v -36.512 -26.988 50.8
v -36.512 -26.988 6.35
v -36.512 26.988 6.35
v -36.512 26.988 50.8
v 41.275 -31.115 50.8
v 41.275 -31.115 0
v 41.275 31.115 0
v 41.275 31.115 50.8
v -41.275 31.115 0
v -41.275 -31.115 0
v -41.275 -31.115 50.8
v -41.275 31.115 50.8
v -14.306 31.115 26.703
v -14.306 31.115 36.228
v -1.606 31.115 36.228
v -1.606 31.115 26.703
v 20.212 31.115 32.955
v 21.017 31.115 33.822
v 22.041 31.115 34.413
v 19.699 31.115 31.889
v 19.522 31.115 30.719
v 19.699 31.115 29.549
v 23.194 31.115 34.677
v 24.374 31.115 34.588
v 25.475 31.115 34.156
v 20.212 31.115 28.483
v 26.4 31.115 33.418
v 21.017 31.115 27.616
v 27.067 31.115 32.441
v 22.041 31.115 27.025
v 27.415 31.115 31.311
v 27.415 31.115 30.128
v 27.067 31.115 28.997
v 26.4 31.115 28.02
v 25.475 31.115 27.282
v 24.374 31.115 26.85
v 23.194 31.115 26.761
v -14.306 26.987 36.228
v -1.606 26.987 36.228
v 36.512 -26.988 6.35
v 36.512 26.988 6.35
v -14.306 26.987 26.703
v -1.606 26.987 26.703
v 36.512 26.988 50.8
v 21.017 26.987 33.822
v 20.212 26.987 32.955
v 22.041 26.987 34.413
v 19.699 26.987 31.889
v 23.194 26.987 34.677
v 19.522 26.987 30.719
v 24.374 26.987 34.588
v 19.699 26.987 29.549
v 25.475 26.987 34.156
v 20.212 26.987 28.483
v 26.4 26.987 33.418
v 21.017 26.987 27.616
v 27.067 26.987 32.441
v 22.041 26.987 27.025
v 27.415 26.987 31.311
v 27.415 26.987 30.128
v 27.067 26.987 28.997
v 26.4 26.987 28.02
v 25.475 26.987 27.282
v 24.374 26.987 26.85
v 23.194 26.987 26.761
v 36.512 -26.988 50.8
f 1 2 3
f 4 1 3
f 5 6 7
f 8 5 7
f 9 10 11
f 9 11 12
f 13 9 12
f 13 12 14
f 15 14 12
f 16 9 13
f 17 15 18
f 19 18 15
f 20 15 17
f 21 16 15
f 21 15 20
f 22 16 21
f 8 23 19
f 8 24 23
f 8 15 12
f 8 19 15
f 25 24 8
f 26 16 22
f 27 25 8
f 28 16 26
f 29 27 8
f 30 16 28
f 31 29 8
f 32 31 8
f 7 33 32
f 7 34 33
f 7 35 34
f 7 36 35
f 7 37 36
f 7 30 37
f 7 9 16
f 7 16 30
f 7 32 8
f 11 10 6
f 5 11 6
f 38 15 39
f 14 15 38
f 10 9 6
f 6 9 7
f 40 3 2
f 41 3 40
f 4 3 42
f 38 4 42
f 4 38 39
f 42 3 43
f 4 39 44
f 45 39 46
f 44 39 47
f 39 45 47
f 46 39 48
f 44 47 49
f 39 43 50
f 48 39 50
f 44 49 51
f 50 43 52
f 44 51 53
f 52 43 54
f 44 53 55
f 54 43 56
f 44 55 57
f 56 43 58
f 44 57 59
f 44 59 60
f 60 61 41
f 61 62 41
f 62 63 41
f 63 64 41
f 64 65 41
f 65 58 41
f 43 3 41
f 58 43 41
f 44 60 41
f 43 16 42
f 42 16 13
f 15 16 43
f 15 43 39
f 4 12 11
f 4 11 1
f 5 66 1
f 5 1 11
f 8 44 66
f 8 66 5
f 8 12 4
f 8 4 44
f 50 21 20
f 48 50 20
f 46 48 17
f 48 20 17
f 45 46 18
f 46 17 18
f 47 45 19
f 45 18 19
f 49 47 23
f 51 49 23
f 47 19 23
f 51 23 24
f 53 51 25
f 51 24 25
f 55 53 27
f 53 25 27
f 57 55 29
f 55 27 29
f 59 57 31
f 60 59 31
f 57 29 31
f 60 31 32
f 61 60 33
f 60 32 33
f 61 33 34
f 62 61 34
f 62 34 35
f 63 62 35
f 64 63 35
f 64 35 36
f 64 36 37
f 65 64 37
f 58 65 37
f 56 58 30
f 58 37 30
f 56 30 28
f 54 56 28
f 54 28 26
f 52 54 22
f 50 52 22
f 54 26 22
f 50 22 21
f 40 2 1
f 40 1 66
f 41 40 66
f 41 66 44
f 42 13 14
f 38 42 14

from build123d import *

# Parameters (mm, degrees)
F0_W     = 82.55
F0_H     = 62.23
F0_W_2   = 73.025
F0_H_2   = 53.975
F1_DEPTH = 50.8
F2_DEPTH = 6.35
F3_R     = 3.96875
F4_DEPTH = 4.1275
F3_W     = 12.7
F3_H     = 9.525
F5_DEPTH = 4.1275


with BuildPart() as f1:
    # F0 (on Top) → F1 (new body)
    with BuildSketch(Plane.XY):
        Rectangle(F0_W, F0_H)
        Rectangle(F0_W_2, F0_H_2, mode=Mode.SUBTRACT)
    extrude(amount=F1_DEPTH)

    # F0 (on Top) → F2 (join)
    with BuildSketch(Plane.XY):
        Rectangle(F0_W_2, F0_H_2)
    extrude(amount=F2_DEPTH)

    # F3 (on face) → F4 (cut, through all)
    with BuildSketch(Plane(origin=(0, 31.115, 0), x_dir=(-1, 0, 0), z_dir=(0, 1, 0))):
        with Locations((-23.491018, 30.719021)):
            Circle(F3_R)
    extrude(amount=-F4_DEPTH, mode=Mode.SUBTRACT)

    # F3 (on face) → F5 (cut, through all)
    with BuildSketch(Plane(origin=(0, 31.115, 0), x_dir=(-1, 0, 0), z_dir=(0, 1, 0))):
        with Locations((7.956224, 31.465962)):
            Rectangle(F3_W, F3_H)
    extrude(amount=-F5_DEPTH, mode=Mode.SUBTRACT)


solid = f1.part
